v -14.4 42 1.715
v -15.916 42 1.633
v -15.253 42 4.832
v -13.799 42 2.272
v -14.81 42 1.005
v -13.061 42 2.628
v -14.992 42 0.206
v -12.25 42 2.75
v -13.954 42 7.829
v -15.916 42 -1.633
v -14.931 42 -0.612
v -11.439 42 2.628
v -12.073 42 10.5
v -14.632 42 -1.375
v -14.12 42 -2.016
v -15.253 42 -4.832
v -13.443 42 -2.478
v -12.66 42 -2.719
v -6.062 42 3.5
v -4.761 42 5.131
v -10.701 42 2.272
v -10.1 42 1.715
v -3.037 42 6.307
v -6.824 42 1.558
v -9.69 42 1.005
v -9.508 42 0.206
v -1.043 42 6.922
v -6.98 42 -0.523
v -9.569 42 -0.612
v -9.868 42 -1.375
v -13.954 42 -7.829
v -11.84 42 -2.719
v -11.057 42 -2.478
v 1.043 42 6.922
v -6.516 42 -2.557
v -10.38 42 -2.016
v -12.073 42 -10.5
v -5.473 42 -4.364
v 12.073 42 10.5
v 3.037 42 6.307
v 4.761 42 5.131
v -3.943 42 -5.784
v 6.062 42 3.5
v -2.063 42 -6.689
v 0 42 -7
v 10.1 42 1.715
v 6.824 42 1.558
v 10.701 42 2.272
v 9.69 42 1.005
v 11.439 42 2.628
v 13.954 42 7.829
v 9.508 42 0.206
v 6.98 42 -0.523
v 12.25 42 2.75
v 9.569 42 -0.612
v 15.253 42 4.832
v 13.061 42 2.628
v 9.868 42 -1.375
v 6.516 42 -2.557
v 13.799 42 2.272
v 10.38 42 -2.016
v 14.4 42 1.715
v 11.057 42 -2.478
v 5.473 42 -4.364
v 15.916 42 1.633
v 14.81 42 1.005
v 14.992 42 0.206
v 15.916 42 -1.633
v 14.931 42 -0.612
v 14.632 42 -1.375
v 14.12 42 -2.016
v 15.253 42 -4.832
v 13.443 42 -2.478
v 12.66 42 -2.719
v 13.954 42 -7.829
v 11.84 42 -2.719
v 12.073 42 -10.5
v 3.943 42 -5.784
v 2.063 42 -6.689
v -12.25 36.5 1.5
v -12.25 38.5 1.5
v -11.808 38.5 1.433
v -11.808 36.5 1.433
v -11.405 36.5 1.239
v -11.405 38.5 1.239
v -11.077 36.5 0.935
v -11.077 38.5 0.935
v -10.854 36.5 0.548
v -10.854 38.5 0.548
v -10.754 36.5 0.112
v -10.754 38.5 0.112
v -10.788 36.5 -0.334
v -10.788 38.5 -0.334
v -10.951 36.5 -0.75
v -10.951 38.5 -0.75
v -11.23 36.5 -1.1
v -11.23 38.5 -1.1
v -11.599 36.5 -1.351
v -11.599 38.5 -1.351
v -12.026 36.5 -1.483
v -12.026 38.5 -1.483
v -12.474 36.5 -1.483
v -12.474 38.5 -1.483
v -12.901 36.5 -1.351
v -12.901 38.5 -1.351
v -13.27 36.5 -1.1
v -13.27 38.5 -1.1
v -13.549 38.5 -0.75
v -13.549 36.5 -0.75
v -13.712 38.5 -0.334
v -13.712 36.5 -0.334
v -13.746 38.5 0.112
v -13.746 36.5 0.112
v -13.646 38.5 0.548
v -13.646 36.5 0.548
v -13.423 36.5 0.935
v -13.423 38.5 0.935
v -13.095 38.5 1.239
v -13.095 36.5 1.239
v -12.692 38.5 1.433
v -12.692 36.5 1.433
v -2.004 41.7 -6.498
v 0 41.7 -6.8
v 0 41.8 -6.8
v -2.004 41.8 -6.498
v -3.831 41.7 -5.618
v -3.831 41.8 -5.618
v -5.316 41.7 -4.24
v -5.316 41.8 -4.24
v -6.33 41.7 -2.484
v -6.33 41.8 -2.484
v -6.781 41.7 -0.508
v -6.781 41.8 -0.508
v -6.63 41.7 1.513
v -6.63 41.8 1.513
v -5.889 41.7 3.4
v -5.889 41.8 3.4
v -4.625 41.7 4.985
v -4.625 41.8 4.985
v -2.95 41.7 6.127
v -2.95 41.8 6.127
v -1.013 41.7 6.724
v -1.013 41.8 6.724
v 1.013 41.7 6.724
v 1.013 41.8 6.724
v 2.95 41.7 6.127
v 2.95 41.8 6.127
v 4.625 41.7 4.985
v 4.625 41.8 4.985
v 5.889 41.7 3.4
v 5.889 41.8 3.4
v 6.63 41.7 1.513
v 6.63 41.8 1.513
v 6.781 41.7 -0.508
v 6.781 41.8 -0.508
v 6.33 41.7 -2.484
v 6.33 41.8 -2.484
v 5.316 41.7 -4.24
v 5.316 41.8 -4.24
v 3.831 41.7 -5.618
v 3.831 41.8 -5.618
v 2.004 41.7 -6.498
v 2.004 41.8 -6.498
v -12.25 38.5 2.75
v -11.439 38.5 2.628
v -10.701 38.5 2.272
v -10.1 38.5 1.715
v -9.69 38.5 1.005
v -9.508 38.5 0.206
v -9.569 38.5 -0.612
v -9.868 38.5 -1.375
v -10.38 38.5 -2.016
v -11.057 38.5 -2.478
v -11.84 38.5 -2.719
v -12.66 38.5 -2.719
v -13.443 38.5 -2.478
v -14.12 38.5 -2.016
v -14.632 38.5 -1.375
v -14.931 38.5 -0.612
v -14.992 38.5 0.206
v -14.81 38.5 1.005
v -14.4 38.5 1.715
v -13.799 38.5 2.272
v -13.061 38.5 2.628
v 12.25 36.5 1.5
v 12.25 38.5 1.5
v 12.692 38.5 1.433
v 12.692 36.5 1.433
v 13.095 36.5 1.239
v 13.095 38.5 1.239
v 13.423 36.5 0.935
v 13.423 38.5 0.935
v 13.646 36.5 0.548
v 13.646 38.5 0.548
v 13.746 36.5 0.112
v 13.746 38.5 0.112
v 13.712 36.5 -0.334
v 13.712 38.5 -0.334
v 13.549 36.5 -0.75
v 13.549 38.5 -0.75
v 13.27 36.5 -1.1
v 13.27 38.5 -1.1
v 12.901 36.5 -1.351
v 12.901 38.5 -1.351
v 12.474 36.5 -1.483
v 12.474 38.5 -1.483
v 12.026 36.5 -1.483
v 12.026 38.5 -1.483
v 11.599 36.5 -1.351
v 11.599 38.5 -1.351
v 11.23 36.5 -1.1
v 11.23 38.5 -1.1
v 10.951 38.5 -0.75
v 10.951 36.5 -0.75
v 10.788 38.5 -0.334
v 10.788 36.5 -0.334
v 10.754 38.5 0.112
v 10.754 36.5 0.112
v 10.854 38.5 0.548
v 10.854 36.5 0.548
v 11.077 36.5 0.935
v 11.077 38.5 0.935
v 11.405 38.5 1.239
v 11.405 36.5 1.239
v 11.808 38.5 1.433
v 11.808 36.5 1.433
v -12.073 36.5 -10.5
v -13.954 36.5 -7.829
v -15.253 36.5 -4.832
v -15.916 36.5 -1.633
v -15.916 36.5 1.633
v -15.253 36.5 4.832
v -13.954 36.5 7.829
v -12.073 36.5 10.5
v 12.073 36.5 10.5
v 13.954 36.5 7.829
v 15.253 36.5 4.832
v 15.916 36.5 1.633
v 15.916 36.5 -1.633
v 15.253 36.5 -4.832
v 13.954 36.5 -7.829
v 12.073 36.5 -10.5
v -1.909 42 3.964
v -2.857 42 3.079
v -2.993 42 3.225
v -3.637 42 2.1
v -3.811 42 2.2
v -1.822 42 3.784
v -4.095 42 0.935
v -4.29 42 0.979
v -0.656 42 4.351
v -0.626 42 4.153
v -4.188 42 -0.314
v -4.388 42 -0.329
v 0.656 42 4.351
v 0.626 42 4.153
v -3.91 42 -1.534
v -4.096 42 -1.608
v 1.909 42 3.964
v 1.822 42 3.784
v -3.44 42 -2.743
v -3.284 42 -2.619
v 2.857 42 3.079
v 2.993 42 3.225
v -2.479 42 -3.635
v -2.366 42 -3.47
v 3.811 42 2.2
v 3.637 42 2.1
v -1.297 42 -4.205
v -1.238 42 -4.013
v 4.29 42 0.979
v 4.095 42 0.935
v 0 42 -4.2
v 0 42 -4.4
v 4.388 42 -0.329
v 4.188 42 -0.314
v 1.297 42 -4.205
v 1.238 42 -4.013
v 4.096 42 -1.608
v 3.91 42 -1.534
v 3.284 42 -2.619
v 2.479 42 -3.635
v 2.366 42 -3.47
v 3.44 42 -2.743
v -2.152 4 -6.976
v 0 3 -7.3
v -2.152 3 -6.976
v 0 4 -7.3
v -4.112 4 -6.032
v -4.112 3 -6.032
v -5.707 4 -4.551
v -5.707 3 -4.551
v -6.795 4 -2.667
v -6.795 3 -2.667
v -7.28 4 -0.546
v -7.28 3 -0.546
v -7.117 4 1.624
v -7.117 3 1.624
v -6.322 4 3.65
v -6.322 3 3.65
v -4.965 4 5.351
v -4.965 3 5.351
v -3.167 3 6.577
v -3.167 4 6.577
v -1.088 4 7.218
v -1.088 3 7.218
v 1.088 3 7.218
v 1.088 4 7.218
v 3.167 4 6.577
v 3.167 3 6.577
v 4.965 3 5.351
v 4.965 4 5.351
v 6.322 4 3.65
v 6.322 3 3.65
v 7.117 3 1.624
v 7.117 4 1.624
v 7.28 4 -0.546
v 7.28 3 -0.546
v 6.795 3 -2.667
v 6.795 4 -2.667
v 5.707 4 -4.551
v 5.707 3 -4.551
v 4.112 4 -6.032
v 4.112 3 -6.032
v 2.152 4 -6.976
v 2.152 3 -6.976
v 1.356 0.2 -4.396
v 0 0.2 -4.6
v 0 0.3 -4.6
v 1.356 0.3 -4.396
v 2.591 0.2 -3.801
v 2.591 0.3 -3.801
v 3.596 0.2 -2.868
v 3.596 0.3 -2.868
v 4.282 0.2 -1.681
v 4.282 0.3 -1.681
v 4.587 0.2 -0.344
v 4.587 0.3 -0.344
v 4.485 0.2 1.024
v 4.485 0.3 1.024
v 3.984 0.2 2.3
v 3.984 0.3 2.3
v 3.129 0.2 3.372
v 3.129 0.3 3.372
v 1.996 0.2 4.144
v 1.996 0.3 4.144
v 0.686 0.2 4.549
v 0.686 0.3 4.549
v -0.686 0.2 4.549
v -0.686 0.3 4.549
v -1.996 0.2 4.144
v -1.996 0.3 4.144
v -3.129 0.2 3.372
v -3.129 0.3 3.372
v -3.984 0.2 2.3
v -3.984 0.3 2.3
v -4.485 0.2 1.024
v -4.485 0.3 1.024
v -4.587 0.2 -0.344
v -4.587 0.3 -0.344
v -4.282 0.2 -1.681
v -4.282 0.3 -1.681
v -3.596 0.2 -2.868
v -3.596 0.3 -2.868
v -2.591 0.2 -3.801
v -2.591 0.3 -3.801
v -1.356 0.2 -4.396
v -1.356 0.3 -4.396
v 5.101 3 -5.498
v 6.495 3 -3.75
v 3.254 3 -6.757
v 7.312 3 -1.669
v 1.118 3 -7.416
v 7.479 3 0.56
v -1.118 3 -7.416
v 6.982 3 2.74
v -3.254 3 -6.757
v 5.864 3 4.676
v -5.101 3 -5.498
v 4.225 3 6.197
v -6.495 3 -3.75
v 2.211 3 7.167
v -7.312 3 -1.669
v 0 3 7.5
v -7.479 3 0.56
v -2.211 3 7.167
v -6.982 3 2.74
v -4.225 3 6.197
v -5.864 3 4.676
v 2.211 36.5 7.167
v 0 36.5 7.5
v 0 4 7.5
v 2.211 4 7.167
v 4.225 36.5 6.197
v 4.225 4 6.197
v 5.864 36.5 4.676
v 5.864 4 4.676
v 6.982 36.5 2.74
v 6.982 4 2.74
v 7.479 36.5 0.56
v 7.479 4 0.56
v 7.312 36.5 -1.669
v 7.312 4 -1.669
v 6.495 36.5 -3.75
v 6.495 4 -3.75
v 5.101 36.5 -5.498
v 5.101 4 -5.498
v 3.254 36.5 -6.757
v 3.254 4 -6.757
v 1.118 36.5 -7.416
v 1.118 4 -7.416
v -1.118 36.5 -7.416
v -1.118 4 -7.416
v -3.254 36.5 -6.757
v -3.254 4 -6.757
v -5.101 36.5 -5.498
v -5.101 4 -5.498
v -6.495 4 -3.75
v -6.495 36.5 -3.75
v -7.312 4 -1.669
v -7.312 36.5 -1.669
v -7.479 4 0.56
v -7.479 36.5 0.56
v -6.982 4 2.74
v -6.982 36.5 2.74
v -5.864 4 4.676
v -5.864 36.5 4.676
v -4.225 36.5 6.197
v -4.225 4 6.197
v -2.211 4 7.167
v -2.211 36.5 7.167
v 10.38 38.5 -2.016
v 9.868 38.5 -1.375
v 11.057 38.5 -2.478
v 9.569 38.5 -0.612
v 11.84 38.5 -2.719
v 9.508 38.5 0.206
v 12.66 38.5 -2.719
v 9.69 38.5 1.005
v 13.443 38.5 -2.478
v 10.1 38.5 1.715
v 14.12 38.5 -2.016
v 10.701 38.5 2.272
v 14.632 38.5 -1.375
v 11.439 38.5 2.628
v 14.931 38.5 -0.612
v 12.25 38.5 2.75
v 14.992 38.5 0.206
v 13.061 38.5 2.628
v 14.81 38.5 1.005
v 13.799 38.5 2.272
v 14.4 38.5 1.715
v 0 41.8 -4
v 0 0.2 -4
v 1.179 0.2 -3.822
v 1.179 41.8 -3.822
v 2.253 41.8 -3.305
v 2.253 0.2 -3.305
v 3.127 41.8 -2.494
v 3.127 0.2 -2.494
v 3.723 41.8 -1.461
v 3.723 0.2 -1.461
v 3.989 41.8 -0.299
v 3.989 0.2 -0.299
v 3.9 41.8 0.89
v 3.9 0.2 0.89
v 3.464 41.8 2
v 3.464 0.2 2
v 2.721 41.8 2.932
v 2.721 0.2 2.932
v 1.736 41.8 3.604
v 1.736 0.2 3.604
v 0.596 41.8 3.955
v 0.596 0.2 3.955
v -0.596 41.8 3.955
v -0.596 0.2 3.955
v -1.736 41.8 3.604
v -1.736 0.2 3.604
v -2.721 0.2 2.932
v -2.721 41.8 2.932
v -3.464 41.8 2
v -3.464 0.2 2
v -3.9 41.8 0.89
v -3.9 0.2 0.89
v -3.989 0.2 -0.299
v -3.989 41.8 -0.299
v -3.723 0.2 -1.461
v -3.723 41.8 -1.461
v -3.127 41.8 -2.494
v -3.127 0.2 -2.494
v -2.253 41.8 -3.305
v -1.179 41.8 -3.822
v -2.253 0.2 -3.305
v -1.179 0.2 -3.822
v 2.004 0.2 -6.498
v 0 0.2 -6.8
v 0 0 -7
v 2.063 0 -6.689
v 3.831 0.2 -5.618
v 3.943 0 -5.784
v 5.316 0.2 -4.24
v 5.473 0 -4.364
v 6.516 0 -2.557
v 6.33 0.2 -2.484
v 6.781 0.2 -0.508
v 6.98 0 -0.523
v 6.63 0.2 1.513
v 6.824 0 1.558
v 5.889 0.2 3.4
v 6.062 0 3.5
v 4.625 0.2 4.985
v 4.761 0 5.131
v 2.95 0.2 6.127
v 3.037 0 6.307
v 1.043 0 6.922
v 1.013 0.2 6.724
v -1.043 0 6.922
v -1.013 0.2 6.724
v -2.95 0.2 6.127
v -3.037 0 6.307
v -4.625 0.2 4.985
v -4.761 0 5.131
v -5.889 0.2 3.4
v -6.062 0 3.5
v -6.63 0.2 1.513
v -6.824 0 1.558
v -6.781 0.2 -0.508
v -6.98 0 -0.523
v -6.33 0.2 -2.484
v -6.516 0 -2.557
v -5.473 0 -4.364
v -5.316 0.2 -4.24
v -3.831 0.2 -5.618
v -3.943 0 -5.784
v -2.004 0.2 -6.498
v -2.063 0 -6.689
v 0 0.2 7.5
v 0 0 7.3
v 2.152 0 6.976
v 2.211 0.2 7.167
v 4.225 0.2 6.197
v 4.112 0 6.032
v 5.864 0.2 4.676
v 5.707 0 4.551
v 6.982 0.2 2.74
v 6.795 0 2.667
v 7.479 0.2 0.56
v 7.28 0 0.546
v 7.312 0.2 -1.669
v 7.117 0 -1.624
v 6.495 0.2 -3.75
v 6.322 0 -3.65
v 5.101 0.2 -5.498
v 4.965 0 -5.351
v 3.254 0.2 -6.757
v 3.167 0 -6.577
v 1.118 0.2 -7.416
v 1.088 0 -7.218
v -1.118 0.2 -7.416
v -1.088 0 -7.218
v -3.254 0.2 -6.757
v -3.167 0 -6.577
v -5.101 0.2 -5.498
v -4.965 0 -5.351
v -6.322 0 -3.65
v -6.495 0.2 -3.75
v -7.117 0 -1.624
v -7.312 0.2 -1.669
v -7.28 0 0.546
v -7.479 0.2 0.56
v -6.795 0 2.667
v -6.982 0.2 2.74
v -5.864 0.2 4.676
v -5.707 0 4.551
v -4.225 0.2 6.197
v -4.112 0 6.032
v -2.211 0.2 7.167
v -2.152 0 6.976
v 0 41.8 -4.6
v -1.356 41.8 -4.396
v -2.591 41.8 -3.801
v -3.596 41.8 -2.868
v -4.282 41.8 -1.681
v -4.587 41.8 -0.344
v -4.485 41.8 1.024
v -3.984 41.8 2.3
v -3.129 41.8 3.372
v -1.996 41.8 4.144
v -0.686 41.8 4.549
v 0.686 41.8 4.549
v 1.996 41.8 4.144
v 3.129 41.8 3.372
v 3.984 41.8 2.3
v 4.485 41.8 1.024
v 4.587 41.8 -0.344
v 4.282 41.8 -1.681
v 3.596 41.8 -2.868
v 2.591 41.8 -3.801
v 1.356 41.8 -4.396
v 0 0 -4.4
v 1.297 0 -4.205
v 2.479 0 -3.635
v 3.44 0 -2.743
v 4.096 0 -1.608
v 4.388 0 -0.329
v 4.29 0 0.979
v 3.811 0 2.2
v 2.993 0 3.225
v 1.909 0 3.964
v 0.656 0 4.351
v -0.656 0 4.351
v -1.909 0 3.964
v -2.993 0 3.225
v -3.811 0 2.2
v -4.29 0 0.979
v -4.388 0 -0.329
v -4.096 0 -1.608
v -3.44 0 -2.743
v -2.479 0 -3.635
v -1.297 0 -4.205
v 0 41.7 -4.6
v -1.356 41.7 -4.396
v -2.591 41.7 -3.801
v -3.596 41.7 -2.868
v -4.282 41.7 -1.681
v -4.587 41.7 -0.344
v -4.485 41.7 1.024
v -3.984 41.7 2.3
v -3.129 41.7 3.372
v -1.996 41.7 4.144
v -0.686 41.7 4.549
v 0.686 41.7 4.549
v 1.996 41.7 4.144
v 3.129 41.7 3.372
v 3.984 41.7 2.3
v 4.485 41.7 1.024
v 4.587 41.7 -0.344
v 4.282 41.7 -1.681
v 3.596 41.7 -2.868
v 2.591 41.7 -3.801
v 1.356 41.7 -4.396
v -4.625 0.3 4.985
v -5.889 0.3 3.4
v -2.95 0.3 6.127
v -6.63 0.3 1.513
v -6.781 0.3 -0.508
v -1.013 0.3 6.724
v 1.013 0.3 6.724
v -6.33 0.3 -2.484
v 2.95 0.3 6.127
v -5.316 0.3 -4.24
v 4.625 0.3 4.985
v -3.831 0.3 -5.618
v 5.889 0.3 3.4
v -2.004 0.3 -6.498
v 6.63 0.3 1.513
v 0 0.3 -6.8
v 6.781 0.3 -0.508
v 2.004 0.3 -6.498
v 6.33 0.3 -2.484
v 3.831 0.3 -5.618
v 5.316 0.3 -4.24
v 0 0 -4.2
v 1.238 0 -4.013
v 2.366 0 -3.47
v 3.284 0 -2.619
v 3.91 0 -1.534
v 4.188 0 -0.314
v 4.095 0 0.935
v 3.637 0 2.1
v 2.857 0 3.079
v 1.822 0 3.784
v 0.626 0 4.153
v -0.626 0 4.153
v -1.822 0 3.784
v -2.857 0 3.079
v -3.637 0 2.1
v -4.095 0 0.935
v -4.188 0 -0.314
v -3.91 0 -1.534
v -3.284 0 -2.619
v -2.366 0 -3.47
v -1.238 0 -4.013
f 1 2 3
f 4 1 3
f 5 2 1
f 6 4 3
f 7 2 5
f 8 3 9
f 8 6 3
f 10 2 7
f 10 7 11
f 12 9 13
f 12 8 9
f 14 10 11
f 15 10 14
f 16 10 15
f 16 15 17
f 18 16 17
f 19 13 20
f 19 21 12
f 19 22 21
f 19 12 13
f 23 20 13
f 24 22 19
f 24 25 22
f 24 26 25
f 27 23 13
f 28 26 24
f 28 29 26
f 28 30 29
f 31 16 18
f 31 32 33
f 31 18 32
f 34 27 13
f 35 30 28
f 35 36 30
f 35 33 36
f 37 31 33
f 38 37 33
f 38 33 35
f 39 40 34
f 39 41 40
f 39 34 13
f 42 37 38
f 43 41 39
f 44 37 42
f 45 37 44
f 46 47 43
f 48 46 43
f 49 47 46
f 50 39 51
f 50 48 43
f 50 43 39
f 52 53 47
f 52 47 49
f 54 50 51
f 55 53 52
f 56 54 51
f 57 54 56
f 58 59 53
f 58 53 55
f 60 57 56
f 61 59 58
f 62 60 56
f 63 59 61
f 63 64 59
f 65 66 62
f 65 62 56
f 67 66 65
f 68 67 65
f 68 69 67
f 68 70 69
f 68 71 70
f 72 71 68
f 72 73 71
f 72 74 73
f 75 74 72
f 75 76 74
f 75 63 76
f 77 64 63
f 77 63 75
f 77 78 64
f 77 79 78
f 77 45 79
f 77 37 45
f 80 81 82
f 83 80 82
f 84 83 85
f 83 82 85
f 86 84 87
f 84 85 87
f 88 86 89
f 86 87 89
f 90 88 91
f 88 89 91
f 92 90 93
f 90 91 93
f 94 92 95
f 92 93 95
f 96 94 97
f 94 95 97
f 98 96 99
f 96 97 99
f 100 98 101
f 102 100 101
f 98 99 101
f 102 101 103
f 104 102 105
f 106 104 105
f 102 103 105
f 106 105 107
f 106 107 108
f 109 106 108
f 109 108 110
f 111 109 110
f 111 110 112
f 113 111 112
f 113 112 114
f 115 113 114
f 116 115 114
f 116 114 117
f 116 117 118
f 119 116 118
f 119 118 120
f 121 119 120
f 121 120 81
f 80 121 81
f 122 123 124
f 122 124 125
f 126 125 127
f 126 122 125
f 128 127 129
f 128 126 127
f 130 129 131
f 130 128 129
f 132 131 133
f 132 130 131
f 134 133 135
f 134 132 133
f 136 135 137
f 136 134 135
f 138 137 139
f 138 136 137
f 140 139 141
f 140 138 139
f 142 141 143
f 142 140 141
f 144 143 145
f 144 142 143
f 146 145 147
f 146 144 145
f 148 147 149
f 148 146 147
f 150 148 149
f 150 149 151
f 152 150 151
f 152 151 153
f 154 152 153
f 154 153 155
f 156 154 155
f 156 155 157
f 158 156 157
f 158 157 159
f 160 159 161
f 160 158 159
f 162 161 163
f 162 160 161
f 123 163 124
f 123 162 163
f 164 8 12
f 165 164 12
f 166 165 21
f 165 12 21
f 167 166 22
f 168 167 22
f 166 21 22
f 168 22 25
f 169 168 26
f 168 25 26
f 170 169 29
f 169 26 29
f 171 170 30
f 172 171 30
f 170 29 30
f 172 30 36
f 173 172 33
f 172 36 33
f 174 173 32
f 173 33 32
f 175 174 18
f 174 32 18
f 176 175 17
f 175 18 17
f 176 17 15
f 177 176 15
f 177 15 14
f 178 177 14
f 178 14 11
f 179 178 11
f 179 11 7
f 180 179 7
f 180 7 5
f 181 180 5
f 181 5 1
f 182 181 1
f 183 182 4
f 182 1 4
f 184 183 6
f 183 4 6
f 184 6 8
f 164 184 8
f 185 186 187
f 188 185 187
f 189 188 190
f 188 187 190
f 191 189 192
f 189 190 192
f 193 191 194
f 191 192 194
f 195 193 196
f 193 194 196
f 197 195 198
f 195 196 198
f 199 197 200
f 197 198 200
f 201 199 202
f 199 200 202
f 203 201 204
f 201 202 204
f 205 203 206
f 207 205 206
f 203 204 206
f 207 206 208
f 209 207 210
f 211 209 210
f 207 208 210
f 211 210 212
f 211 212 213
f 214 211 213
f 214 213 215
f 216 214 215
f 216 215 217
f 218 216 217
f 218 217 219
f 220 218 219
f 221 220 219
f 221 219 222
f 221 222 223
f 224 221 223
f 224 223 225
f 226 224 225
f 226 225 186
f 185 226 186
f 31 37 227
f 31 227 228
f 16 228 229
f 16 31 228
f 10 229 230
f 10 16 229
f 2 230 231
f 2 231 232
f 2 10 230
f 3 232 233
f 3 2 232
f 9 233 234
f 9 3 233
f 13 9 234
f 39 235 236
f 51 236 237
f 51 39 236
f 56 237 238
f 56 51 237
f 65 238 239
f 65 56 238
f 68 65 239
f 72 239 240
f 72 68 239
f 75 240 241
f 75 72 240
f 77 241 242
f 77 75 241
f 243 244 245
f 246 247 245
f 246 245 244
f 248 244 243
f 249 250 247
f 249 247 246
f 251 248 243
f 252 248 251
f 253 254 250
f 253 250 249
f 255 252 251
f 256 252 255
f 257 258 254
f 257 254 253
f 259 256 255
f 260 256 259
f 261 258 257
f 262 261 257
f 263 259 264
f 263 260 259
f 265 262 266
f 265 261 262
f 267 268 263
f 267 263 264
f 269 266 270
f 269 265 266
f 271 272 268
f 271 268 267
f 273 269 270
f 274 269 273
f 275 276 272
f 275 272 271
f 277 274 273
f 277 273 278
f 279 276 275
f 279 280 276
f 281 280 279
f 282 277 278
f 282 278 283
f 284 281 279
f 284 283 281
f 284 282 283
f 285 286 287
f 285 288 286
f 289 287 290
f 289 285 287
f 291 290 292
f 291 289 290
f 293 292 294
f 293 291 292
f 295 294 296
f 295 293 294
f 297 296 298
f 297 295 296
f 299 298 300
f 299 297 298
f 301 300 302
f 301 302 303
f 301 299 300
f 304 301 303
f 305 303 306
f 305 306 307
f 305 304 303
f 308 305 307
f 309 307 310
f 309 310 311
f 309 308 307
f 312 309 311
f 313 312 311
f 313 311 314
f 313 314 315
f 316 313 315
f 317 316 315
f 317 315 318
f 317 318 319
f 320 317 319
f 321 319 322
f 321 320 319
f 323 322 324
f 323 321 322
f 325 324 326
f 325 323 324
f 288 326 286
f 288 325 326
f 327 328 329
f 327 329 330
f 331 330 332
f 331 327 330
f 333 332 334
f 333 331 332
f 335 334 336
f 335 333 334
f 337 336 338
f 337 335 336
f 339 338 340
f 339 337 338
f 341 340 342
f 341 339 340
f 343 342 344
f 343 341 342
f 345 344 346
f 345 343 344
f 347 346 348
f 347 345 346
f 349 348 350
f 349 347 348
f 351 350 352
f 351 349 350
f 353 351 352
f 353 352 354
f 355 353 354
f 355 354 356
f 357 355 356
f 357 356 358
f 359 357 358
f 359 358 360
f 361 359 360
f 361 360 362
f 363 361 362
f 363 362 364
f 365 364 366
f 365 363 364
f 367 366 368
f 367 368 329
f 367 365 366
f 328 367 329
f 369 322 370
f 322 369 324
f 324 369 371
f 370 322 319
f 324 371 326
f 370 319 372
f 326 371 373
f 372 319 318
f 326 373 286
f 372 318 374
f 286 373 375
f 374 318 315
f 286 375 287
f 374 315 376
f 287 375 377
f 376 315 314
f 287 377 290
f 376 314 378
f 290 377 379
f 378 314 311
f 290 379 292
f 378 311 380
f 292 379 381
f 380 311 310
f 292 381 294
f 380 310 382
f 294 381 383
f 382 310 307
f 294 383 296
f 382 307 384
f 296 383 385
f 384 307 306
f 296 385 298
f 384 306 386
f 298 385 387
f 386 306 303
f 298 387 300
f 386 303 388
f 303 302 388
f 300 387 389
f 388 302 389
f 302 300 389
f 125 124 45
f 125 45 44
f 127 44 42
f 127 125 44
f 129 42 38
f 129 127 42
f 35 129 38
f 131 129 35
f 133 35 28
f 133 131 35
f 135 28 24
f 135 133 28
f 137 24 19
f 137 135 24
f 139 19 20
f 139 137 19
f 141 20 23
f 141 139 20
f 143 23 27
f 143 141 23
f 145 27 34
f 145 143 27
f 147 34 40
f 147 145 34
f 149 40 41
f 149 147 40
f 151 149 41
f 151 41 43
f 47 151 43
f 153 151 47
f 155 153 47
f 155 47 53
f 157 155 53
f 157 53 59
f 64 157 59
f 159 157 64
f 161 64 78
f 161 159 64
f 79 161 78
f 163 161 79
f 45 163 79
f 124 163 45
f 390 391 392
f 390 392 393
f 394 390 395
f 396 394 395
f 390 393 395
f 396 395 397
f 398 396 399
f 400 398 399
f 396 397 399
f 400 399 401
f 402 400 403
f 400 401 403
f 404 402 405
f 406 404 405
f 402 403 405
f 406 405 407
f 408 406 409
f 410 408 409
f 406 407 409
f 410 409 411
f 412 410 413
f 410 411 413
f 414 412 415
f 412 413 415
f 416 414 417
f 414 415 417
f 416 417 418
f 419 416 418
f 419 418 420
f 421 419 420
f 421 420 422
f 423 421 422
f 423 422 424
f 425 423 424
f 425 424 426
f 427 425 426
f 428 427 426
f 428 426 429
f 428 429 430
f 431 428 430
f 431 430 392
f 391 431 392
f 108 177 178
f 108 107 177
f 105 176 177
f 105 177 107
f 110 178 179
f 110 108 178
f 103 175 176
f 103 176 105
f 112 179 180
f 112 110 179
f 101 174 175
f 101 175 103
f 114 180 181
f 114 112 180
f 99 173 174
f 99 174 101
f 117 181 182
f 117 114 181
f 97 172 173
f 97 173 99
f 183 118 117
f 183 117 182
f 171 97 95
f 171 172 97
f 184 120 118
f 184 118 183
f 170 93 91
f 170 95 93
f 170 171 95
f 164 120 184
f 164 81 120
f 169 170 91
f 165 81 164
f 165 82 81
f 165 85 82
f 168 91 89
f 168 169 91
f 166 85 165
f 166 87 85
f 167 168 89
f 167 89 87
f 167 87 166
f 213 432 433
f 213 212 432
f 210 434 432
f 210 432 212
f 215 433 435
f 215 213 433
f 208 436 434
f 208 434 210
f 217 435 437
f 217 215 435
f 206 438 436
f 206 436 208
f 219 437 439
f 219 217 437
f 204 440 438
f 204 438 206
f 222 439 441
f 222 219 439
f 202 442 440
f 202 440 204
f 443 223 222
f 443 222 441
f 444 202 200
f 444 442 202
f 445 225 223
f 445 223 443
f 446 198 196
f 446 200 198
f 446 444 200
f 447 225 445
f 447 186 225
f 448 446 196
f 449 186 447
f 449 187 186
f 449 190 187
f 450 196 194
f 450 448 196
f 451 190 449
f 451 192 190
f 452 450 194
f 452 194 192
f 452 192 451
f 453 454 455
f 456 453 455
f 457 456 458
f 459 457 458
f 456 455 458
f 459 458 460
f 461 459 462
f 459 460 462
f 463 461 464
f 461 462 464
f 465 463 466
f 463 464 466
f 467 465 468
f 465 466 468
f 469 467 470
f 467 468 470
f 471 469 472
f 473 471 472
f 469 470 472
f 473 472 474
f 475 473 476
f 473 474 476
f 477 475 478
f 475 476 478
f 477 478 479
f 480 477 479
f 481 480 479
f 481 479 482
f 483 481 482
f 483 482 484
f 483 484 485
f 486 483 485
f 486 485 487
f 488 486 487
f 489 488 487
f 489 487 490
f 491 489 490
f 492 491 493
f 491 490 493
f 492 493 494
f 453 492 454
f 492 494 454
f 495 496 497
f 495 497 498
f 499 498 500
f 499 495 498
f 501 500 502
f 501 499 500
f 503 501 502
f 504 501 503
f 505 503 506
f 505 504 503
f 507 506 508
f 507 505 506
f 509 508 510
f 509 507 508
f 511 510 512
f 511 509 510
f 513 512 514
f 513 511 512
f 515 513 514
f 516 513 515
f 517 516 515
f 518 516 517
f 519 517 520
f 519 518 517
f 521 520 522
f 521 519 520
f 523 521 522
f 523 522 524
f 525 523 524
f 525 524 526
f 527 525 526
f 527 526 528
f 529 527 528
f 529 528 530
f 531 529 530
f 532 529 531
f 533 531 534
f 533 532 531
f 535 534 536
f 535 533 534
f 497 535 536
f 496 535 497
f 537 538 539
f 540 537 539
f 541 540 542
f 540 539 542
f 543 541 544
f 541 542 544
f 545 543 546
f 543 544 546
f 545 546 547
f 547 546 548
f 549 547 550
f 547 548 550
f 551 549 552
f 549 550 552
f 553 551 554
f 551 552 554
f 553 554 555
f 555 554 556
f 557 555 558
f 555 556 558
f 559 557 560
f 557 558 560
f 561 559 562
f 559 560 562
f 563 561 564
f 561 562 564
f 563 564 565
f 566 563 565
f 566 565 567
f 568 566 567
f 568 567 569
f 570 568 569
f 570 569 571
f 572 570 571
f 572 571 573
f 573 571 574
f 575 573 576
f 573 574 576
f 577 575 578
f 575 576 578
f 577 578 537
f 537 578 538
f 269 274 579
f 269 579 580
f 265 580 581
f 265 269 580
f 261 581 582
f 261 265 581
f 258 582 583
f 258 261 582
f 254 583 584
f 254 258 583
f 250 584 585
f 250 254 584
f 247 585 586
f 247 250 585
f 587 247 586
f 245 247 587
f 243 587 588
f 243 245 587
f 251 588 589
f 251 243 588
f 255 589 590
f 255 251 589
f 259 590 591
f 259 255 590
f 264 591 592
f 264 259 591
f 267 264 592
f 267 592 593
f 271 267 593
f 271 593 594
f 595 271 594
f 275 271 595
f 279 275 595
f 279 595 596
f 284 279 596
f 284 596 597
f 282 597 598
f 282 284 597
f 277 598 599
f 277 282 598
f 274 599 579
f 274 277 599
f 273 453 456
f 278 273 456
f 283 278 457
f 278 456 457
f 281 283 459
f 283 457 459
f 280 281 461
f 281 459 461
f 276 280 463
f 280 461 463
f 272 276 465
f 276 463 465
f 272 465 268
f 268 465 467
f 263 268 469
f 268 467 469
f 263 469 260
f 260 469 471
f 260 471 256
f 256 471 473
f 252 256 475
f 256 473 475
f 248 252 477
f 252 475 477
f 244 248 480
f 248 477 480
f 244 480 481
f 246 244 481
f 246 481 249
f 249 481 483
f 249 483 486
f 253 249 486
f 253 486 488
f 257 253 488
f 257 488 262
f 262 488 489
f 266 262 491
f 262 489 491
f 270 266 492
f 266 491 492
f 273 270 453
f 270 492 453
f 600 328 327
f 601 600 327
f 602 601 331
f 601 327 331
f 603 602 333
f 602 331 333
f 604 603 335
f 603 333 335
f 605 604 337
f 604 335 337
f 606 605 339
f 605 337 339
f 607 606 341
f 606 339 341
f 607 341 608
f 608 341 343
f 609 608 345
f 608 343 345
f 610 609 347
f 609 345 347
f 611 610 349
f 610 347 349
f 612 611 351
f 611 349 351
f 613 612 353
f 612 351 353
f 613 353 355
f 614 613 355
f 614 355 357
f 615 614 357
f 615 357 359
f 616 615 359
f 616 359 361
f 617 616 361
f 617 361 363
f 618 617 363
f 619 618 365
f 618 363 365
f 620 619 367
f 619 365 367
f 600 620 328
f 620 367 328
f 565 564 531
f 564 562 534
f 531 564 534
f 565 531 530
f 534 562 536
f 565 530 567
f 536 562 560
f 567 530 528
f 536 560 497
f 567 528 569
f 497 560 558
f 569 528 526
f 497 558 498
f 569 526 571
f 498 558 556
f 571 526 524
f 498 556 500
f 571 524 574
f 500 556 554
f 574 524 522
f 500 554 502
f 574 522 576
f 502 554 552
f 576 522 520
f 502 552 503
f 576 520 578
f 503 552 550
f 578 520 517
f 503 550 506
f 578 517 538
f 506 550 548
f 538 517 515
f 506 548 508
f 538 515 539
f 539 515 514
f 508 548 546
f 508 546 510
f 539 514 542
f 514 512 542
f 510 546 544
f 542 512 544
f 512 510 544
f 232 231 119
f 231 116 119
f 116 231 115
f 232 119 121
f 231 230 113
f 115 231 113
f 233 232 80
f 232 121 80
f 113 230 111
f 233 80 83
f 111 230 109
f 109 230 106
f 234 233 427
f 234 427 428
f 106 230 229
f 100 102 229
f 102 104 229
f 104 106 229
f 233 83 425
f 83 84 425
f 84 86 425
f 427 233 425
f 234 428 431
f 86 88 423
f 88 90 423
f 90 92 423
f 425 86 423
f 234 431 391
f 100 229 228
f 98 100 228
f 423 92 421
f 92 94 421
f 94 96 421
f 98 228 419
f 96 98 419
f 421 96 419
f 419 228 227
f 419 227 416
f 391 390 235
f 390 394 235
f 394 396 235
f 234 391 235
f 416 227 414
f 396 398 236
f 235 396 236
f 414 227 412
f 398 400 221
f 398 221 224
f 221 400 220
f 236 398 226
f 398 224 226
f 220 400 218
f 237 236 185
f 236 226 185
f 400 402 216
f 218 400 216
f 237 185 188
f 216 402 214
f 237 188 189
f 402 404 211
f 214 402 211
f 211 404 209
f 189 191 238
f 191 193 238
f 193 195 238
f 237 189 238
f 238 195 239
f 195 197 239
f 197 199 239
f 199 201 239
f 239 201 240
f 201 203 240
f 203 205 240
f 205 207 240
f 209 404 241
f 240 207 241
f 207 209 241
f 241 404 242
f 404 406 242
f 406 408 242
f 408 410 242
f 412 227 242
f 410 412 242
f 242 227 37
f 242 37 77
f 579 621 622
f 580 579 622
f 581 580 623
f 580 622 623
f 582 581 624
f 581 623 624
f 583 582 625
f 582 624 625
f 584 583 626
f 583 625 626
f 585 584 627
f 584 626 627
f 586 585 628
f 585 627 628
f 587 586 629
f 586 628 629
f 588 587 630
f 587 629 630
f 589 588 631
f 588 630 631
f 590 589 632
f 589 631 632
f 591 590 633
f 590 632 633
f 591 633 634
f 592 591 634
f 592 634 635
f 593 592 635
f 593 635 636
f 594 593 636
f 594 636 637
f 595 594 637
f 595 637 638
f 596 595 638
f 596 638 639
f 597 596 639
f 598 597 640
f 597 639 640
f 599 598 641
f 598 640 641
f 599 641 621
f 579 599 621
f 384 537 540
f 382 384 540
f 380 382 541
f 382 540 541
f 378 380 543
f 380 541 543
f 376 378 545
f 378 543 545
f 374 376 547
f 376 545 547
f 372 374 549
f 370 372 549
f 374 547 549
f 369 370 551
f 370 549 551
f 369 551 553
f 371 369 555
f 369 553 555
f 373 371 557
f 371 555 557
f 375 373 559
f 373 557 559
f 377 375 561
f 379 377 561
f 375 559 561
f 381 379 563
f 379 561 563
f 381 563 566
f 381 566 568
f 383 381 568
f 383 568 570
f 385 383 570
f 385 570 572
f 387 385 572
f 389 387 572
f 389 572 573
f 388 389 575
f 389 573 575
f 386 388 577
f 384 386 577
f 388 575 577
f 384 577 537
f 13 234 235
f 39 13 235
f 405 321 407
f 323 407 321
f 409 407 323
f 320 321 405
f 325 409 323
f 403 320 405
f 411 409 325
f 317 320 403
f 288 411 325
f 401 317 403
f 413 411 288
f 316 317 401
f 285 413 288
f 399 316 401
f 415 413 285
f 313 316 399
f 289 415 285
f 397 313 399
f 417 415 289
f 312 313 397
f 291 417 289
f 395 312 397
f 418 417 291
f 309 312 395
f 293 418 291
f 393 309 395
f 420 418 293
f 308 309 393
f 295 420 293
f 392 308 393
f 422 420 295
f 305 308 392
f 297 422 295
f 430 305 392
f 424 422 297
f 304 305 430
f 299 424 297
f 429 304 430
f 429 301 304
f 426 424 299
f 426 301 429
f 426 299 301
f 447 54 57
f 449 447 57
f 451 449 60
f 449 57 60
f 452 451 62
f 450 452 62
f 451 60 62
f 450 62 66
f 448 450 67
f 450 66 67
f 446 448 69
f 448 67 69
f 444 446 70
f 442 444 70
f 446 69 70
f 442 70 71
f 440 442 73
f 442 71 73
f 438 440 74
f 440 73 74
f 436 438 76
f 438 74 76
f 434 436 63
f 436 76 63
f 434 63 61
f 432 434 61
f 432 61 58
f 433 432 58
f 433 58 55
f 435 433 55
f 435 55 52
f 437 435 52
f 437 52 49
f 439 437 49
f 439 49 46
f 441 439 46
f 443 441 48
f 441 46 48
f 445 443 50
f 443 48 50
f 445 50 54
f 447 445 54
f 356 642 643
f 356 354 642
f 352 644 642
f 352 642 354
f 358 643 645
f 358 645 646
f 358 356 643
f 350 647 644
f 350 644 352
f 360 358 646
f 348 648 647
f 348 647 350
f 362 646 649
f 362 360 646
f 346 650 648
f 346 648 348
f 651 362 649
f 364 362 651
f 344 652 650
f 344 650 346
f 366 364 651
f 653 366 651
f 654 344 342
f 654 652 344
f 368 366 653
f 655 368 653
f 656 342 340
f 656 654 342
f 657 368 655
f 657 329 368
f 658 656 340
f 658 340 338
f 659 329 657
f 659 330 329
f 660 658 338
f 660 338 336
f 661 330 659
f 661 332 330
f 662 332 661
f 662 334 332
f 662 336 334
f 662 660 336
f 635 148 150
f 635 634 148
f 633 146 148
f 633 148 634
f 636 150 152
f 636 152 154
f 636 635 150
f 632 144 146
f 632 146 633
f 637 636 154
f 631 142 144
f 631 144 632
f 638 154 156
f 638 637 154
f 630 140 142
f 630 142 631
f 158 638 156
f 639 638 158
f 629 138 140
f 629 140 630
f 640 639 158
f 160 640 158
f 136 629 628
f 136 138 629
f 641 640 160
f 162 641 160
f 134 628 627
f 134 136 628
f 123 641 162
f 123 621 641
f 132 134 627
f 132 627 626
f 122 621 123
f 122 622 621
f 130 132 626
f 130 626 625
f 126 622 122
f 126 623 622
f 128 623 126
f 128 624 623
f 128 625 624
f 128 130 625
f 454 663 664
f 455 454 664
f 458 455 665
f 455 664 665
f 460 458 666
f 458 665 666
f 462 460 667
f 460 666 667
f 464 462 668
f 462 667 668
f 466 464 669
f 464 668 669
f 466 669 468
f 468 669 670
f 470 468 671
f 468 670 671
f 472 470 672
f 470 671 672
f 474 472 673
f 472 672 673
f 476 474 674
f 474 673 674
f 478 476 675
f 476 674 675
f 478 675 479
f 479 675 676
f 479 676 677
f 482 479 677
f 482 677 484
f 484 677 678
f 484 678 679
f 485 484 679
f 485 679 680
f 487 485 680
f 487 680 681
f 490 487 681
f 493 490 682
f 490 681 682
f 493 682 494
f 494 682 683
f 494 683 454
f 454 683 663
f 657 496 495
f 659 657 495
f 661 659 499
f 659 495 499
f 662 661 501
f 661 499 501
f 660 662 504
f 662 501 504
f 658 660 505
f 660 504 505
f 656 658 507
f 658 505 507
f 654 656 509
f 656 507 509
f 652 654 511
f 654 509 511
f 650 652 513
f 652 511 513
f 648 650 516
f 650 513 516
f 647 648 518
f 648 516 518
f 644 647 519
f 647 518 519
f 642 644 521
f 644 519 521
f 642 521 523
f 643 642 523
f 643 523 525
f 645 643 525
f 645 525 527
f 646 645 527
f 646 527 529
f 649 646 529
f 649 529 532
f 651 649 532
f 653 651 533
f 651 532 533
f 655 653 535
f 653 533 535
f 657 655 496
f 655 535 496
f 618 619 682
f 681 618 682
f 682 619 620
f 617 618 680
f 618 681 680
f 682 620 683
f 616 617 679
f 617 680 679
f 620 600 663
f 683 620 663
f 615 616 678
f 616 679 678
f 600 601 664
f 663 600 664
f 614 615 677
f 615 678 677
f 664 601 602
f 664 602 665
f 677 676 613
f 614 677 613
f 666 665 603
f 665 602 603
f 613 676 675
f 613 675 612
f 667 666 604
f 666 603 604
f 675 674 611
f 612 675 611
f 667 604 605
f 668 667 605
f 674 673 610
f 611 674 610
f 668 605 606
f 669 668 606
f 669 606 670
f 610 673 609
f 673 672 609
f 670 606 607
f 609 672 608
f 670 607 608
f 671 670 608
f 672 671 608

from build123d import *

# Parameters (mm, degrees)
SKETCH1_R      = 7.5
EXTRUDE1_DEPTH = 36.5
SKETCH2_W      = 32
SKETCH2_H      = 21
EXTRUDE2_DEPTH = 5.5
SKETCH3_R      = 4
EXTRUDE3_DEPTH = 42
SKETCH4_R      = 21
SKETCH4_R_2    = 16
EXTRUDE4_DEPTH = 10
SKETCH5_R      = 6.8
SKETCH5_R_2    = 4.6
EXTRUDE5_DEPTH = 0.3
EXTRUDE6_START = -0.3
SKETCH6_R      = 6.8
SKETCH6_R_2    = 4.6
EXTRUDE6_DEPTH = 0.3
SKETCH7_W      = 0.2
SKETCH7_H      = 1
SKETCH8_R      = 1.5
EXTRUDE7_DEPTH = 8
SKETCH8_3_R    = 2.75
EXTRUDE8_DEPTH = 3.5
CHAMFER1_SIZE  = 0.2


with BuildPart() as part:
    # Sketch1 → Extrude1 (new body)
    with BuildSketch(Plane(origin=(0, 0, 0), x_dir=(1, 0, 0), z_dir=(0, 1, 0))):
        Circle(SKETCH1_R)
    extrude(amount=EXTRUDE1_DEPTH)

    # Sketch2 → Extrude2 (add)
    with BuildSketch(Plane(origin=(0, 36.5, 0), x_dir=(1, 0, 0), z_dir=(0, 1, 0))):
        Rectangle(SKETCH2_W, SKETCH2_H)
    extrude(amount=EXTRUDE2_DEPTH)

    # Sketch3 → Extrude3 (cut)
    with BuildSketch(Plane.XZ):
        Circle(SKETCH3_R)
    extrude(amount=-EXTRUDE3_DEPTH, mode=Mode.SUBTRACT)

    # Sketch4 → Extrude4 (cut)
    with BuildSketch(Plane(origin=(0, 42, 0), x_dir=(1, 0, 0), z_dir=(0, 1, 0))):
        Circle(SKETCH4_R)
        Circle(SKETCH4_R_2, mode=Mode.SUBTRACT)
    extrude(amount=-EXTRUDE4_DEPTH, mode=Mode.SUBTRACT)

    # Sketch5 → Extrude5 (cut)
    with BuildSketch(Plane.XZ):
        Circle(SKETCH5_R)
        Circle(SKETCH5_R_2, mode=Mode.SUBTRACT)
    extrude(amount=-EXTRUDE5_DEPTH, mode=Mode.SUBTRACT)

    # Sketch6 → Extrude6 (cut)
    with BuildSketch(Plane(origin=(0, 42, 0), x_dir=(1, 0, 0), z_dir=(0, 1, 0)).offset(EXTRUDE6_START)):
        Circle(SKETCH6_R)
        Circle(SKETCH6_R_2, mode=Mode.SUBTRACT)
    extrude(amount=EXTRUDE6_DEPTH, mode=Mode.SUBTRACT)

    # Sketch7 → Cut-Revolve1 (revolve, cut)
    with BuildSketch(Plane(origin=(0, 0, 0), x_dir=(0, 0, -1), z_dir=(1, 0, 0))):
        with Locations((7.4, 3.5)):
            Rectangle(SKETCH7_W, SKETCH7_H)
    revolve(axis=Axis((0, 0, 0), (0, 1, 0)), mode=Mode.SUBTRACT)

    # Sketch8 → Extrude7 (cut)
    with BuildSketch(Plane(origin=(0, 42, 0), x_dir=(1, 0, 0), z_dir=(0, 1, 0))):
        with Locations((-12.25, 0)):
            Circle(SKETCH8_R)
        with Locations((12.25, 0)):
            Circle(SKETCH8_R)
    extrude(amount=-EXTRUDE7_DEPTH, mode=Mode.SUBTRACT)

    # Sketch8<3> → Extrude8 (cut)
    with BuildSketch(Plane(origin=(0, 42, 0), x_dir=(1, 0, 0), z_dir=(0, 1, 0))):
        with Locations((-12.25, 0)):
            Circle(SKETCH8_3_R)
        with Locations((12.25, 0)):
            Circle(SKETCH8_3_R)
    extrude(amount=-EXTRUDE8_DEPTH, mode=Mode.SUBTRACT)

    # Chamfer1
    chamfer1_edges = [part.edges().sort_by_distance(p)[0] for p in [
        (-4, 0, 0),
        (-7.5, 0, 0),
        (-4.6, 0, 0),
        (-6.8, 0, 0),
        (-4.6, 42, 0),
        (-4, 42, 0),
        (-6.8, 42, 0),
    ]]
    chamfer(chamfer1_edges, length=CHAMFER1_SIZE)


solid = part.part
